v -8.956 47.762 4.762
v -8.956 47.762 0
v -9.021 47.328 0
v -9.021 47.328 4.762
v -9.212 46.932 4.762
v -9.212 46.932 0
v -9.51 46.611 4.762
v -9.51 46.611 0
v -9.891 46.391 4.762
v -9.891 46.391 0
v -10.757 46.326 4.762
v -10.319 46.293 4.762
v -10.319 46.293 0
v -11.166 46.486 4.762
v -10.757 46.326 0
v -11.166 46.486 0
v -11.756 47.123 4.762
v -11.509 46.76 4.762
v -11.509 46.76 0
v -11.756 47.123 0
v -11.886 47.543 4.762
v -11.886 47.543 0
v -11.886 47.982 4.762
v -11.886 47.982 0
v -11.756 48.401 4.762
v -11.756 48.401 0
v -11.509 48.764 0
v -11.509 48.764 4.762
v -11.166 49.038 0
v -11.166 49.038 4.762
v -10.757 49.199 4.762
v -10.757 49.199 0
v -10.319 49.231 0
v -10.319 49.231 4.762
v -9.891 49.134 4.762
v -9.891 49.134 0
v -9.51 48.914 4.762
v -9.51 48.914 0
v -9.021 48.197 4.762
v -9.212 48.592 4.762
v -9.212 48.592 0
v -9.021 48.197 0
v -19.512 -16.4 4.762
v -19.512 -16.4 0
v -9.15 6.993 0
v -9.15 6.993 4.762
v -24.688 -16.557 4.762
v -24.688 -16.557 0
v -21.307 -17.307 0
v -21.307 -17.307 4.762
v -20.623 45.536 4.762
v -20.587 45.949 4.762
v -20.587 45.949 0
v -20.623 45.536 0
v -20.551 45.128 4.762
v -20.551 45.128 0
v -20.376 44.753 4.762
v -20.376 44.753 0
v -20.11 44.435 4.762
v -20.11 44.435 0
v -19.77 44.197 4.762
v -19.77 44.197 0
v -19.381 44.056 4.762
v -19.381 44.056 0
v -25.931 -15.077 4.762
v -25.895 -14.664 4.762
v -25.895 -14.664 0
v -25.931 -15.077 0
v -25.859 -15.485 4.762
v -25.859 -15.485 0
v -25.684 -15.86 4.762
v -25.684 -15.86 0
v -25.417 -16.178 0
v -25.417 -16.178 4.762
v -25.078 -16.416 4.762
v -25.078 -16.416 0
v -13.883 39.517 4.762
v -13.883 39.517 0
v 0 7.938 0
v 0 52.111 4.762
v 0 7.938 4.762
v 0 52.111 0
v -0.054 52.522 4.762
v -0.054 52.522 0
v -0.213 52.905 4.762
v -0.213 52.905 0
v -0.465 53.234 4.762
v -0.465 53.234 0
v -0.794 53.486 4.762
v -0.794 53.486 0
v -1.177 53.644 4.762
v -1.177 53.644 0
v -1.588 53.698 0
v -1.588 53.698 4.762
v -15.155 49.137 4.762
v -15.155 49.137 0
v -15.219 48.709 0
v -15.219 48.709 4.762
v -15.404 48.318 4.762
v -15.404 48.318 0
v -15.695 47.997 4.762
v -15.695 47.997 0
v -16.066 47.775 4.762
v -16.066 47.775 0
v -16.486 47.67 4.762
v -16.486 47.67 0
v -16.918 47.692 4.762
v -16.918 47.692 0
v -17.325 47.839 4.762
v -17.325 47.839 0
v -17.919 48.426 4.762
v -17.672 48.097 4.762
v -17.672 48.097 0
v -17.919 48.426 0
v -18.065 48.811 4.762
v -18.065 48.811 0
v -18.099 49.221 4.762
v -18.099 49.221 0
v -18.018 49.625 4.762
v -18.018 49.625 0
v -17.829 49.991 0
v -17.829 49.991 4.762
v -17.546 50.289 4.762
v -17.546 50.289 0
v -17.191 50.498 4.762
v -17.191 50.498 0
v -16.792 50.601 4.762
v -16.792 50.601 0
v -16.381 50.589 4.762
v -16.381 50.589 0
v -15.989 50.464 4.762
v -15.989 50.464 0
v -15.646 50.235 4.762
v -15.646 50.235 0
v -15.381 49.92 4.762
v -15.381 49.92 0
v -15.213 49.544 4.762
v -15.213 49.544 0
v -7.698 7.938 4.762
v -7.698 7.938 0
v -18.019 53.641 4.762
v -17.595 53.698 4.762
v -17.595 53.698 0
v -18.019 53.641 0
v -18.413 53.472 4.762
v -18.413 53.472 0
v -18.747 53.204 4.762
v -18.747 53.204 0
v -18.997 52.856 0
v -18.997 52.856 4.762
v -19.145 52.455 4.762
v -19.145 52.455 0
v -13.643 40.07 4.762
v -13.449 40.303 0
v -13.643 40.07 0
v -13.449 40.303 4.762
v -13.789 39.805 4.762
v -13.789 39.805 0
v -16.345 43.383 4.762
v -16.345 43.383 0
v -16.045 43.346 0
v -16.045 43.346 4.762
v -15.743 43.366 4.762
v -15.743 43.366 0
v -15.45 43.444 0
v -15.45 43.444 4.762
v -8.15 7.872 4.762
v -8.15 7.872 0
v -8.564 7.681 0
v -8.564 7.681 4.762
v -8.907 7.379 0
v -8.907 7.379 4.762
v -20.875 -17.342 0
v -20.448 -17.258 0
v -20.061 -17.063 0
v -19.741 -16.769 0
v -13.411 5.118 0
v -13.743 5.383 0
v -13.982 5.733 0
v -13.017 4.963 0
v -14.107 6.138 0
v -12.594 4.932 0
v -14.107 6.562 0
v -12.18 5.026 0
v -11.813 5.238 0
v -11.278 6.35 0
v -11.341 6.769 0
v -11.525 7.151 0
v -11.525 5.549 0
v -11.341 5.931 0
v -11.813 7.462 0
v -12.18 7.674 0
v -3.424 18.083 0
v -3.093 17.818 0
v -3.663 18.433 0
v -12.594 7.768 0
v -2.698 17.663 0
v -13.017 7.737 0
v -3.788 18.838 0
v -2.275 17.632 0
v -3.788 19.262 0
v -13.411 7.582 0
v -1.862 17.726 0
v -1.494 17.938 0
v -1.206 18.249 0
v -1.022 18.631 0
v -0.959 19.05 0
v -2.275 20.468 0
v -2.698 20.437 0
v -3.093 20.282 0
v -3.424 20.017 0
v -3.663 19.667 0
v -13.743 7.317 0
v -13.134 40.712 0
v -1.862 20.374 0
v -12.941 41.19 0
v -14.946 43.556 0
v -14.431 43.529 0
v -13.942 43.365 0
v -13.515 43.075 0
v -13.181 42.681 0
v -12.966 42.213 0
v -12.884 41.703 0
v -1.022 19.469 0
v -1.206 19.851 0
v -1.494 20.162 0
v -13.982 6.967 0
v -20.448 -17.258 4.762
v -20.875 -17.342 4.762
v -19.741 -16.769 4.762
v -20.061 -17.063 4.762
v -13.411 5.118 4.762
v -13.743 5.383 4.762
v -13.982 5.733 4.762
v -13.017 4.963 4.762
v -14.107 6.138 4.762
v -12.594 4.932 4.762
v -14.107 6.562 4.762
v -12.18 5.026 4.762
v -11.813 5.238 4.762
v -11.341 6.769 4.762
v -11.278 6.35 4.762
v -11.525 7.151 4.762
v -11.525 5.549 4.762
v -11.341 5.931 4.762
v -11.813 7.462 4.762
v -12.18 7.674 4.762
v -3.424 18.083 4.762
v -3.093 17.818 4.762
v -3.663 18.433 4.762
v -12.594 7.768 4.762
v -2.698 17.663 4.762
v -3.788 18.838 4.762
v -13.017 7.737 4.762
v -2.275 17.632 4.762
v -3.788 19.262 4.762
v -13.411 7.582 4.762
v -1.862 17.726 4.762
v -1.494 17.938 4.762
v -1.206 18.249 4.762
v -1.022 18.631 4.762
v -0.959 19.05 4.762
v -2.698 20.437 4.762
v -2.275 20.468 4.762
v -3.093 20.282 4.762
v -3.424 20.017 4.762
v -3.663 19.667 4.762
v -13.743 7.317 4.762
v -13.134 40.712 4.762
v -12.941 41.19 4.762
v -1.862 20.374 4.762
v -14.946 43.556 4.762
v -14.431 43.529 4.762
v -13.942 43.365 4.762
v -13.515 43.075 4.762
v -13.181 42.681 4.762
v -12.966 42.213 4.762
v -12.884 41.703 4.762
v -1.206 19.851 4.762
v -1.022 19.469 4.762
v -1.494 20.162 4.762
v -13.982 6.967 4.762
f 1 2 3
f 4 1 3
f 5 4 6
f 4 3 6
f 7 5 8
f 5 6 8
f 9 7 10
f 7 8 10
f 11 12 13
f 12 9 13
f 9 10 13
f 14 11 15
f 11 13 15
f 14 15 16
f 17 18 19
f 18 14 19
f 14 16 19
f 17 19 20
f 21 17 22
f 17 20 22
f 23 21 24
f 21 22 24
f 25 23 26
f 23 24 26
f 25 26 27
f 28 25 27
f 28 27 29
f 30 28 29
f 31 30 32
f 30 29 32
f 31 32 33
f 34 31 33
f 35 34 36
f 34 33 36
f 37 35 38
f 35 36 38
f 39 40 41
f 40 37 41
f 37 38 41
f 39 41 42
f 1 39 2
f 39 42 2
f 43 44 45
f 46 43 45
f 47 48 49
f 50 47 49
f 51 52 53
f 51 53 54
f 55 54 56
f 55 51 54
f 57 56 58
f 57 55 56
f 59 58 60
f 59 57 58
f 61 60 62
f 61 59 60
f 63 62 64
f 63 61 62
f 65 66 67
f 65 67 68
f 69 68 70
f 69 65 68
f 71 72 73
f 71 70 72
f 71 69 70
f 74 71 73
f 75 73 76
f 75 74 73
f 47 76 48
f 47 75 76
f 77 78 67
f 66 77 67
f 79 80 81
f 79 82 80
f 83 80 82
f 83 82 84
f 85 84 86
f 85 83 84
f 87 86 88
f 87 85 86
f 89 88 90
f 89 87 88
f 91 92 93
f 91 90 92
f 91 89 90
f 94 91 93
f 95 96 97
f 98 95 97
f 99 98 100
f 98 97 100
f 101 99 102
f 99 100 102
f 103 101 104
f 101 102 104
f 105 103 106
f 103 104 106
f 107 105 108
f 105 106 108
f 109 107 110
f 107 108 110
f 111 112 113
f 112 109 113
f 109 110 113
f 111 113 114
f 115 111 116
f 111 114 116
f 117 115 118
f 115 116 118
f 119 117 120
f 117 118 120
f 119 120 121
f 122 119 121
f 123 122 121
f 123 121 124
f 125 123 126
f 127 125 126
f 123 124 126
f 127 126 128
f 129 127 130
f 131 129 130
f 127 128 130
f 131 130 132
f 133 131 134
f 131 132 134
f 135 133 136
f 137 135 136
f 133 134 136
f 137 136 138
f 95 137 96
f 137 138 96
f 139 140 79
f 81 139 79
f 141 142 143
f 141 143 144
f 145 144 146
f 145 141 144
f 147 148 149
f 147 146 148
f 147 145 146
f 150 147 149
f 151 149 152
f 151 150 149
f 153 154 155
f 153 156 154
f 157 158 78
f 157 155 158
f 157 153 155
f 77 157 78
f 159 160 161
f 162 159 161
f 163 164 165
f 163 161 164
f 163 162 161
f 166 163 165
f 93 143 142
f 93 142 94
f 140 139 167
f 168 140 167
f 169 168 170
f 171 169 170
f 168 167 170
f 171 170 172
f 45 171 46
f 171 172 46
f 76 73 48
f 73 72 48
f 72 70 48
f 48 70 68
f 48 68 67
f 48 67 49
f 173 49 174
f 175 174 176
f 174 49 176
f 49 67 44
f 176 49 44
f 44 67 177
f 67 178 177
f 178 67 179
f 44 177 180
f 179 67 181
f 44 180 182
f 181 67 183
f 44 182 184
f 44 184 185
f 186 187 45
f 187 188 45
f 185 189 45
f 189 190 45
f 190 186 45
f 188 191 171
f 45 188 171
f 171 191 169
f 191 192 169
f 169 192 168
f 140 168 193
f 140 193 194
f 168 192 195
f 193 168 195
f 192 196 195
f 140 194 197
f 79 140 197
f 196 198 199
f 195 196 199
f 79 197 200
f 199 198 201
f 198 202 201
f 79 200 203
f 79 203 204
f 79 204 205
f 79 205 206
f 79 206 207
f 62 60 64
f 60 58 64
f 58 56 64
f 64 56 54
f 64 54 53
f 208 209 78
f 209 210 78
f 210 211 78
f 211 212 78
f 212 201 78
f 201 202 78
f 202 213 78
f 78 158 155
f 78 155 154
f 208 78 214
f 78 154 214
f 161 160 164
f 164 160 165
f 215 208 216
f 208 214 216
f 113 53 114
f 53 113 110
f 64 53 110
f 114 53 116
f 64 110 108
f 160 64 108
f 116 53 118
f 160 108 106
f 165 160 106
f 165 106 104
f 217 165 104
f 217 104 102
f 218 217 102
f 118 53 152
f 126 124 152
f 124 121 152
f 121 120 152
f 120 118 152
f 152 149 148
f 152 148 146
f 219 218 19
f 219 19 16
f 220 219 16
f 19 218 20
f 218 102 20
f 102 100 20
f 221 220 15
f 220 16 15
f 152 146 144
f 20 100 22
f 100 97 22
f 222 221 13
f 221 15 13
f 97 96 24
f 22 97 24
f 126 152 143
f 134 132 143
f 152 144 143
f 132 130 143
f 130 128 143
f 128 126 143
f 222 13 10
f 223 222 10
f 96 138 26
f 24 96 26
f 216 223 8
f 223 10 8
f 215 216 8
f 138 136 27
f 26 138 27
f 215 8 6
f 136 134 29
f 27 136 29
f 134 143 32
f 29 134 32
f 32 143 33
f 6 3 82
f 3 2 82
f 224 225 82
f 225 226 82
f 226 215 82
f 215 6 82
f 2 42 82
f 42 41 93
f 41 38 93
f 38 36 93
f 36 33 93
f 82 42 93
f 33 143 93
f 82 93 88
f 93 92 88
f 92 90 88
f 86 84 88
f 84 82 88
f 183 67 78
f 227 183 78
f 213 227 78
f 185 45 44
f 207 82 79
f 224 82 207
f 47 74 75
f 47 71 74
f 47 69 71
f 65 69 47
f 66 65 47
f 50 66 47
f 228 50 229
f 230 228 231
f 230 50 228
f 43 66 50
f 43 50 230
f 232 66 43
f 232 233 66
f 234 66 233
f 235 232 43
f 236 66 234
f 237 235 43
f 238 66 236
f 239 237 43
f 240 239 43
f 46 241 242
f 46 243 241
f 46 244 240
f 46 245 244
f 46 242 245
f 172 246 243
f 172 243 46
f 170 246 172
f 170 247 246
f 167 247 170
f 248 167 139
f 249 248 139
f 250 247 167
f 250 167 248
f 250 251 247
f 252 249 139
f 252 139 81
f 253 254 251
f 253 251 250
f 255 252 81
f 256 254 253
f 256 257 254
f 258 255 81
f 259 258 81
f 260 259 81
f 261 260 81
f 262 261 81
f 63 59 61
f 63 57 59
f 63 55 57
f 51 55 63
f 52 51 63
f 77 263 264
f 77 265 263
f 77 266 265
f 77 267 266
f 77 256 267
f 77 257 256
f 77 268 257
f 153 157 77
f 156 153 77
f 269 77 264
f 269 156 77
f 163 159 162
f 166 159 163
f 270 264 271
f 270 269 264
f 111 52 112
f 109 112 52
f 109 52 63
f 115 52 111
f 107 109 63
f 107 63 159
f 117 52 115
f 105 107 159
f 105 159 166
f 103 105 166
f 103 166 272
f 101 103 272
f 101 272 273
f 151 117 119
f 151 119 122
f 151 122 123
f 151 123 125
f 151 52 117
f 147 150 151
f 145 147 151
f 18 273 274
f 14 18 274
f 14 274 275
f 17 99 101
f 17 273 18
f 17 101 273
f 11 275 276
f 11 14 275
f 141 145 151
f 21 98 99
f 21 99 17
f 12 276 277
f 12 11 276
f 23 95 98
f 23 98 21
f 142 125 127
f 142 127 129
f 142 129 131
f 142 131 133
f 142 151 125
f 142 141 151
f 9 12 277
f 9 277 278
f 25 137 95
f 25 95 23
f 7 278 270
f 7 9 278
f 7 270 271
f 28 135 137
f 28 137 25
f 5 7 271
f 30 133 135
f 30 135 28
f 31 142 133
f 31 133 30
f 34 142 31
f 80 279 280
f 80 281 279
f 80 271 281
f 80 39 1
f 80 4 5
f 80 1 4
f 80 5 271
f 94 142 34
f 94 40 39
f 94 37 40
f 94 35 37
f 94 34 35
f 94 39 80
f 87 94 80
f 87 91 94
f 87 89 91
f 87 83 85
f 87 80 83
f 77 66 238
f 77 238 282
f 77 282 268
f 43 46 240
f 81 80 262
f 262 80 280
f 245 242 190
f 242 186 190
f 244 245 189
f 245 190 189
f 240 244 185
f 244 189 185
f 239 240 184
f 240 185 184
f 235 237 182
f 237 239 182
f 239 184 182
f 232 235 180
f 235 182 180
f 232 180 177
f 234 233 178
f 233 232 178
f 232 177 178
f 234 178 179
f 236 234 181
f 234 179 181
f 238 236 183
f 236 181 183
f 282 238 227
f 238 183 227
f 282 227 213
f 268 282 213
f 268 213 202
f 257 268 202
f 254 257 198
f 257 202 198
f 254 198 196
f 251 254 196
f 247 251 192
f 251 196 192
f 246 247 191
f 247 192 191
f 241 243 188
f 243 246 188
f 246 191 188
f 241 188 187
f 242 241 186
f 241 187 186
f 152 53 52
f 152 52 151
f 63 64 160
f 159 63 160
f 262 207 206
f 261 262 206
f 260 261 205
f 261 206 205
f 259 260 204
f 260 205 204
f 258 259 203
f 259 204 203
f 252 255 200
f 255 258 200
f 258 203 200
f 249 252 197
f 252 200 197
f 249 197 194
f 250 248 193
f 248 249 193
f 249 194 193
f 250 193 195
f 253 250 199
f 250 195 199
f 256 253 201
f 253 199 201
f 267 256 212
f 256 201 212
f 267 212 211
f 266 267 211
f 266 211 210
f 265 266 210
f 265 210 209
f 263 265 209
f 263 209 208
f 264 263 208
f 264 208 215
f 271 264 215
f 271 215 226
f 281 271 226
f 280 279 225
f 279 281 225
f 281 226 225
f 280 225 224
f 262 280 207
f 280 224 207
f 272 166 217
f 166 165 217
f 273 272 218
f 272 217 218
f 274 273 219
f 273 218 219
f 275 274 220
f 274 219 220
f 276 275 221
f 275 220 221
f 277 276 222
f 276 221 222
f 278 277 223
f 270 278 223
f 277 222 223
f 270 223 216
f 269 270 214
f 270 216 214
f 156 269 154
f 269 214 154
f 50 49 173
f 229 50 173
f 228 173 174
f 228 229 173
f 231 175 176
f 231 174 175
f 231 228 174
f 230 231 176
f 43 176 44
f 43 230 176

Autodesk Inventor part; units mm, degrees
ref_plane "YZ Plane" through (0, 0, 0) normal (1, 0, 0) x (0, 1, 0)
ref_plane "XZ Plane" through (0, 0, 0) normal (0, 1, 0) x (-1, 0, 0)
ref_plane "XY Plane" through (0, 0, 0) normal (0, 0, 1) x (1, 0, 0)
sketch "Sketch1" plane through (0, 0, 0) normal (0, 0, 1) x (1, 0, 0)
  line L0 (0, 0) -> (0, 136.525) construction
  line L1 (-11.7886, 12.2907) -> (-39.6863, 18.4755) construction
  line L2 (-39.6863, 18.4755) -> (-33.3297, 47.1481) construction
  line L3 (-33.3297, 47.1481) -> (-5.432, 40.9633)
  line L4 (-5.432, 40.9633) -> (-11.7886, 12.2907) construction
  line L5 (-39.6863, 18.4755) -> (-5.432, 40.9633) construction
  line L6 (-33.3297, 47.1481) -> (-11.7886, 12.2907) construction
  circle A0 centre (-53.975, 12.7) radius 3.175 construction
  circle A1 centre (-53.975, 12.7) radius 6.35 construction
  line L7 (0, 0) -> (-54.712, 6.3929) construction
  line L8 (-59.6703, 15.5082) -> (0, 136.525) construction
  line L9 (-27.1302, 45.7737) -> (-37.4529, 28.5497) construction
  line L10 (-11.6315, 42.3377) -> (-9.5552, 22.3649) construction
  line L11 (-19.3809, 44.0557) -> (-25.7374, 15.3831) construction
  line L12 (0, 92.075) -> (-19.7574, 96.4551) construction
  line L13 (-35.3766, 8.5768) -> (-19.8779, 5.1408) construction
  line L14 (-19.8779, 5.1408) -> (-21.2523, -1.0586) construction
  line L15 (-21.2523, -1.0586) -> (-36.751, 2.3773) construction
  line L16 (-36.751, 2.3773) -> (-35.3766, 8.5768) construction
  line L17 (-35.3766, 8.5768) -> (-41.27, 4.8223) construction
  line L18 (-19.8779, 5.1408) -> (-17.9381, 2.096) construction
  line L19 (-5.432, 40.9633) -> (-33.3297, 47.1481) construction
  line L20 (-33.3297, 47.1481) -> (-32.2475, 52.0296) construction
  line L21 (-32.2475, 52.0296) -> (-4.3498, 45.8448) construction
  line L22 (-4.3498, 45.8448) -> (-5.432, 40.9633) construction
  line L23 (-53.2878, 15.7997) -> (-53.975, 12.7) construction
  line L24 (-53.975, 12.7) -> (-57.0747, 13.3872) construction
  line L25 (-27.6272, 6.8588) -> (-34.4992, -24.1386) construction
  line L26 (-31.8676, 50.076) -> (-5.5198, 44.2349)
  line L27 (-5.5198, 44.2349) -> (-4.489, 48.8845) construction
  line L28 (-4.489, 48.8845) -> (-30.8368, 54.7256) construction
  line L29 (-30.8368, 54.7256) -> (-31.8676, 50.076) construction
  line L30 (-31.3522, 52.4008) -> (-5.0044, 46.5597) construction
  circle A2 centre (-29.0274, 51.8854) radius 1.4732 construction
  circle A3 centre (-22.8279, 50.5111) radius 1.4732 construction
  circle A4 centre (-16.6284, 49.1367) radius 1.4732
  circle A5 centre (-10.4289, 47.7623) radius 1.4732
  circle A6 centre (-10.3614, 84.7398) radius 1.4732 construction
  line L31 (-53.975, 12.7) -> (-13.3751, 95.0402) construction
  line L32 (-32.2923, 56.6744) -> (0, 49.5153)
  circle A7 centre (-10.3614, 84.7398) radius 4.7625 construction
  line L33 (-4.7625, 50.5712) -> (-4.7625, 93.1308) construction
  line L34 (-27.5056, 55.6132) -> (-14.3936, 82.2055) construction
  line L35 (-5.6003, 84.6261) -> (-4.7625, 84.4403) construction
  line L36 (-17.9381, 2.096) -> (0, 2.096) construction
  line L37 (0, 2.096) -> (0, -1.079) construction
  line L38 (0, -1.079) -> (-17.9381, -1.079) construction
  line L39 (-17.9381, -1.079) -> (-17.9381, 2.096) construction
  circle A8 centre (-12.7, 7.9375) radius 1.5875 construction
  line L40 (-12.7, 7.9375) -> (0, 7.9375)
  line L41 (0, 7.9375) -> (-17.9381, 2.096) construction
  circle A9 centre (-12.7, 7.9375) radius 3.175 construction
  line L42 (-9.525, 7.9375) -> (-9.525, 4.8357) construction
  line L43 (-9.525, 7.9375) -> (0, 7.9375) construction
  line L44 (-17.9187, 46.9837) -> (-16.8879, 51.6333)
  line L45 (-12.4942, 45.7811) -> (-26.2381, -16.2137)
  line L46 (0, 66.675) -> (0, 7.9375)
  line L47 (-26.2381, -16.2137) -> (-20.0386, -17.5881)
  line L48 (-20.0386, -17.5881) -> (-8.7313, 7.9375)
  circle A10 centre (-12.7, 6.35) radius 1.4224
  line L49 (0, 13.4938) -> (-4.7625, 13.4938) construction
  line L50 (-4.7625, 13.4938) -> (-4.7625, 24.6063) construction
  line L51 (-4.7625, 24.6063) -> (0, 24.6063) construction
  line L52 (0, 24.6063) -> (0, 13.4938)
  line L53 (-4.7625, 19.05) -> (0, 19.05) construction
  circle A11 centre (-2.3813, 19.05) radius 1.4224
  line L54 (-20.7405, 8.5842) -> (-9.7454, 58.18)
  line L55 (-9.7454, 58.18) -> (-3.5459, 56.8056) construction
  line L56 (-3.5459, 56.8056) -> (-14.5411, 7.2098) construction
  line L57 (-14.5411, 7.2098) -> (-20.7405, 8.5842)
  line L58 (-12.7, 6.35) -> (-12.7, 7.9375) construction
  line L59 (-11.5442, 1.5875) -> (-9.525, 1.5875)
  line L60 (-9.525, 1.5875) -> (-9.525, 7.9375)
  line L61 (-9.525, 7.9375) -> (-11.5442, 7.9375)
  line L62 (-11.5442, 7.9375) -> (-11.5442, 1.5875) construction
  line L63 (-9.7454, 58.18) -> (-15.9449, 59.5544)
  line L64 (-15.9449, 59.5544) -> (-14.6504, 65.3933)
  line L65 (-14.6504, 65.3933) -> (0, 66.675)
  line L66 (-9.7454, 58.18) -> (-17.3193, 53.3549) construction
  arc A12 (-10.2313, 55.9882) -> (-11.9373, 58.6659) centre (-11.0843, 57.3271) ccw
  line L67 (-4.7625, 57.15) -> (0, 57.15) construction
  circle A13 centre (-2.3813, 57.15) radius 1.4224
  circle A14 centre (-2.3813, 63.5) radius 1.4224
  line L68 (-20.9307, 44.3993) -> (-18.8691, 53.6985)
  line L69 (-12.4942, 45.7811) -> (-16.2811, 43.3685) construction
  arc A15 (-13.0773, 43.1508) -> (-15.1244, 46.3642) centre (-14.1008, 44.7575) ccw
  line L70 (-18.8691, 53.6985) -> (0, 53.6985)
  line L71 (-13.1814, 42.6813) -> (-14.788, 41.6578) construction
  circle A16 centre (-14.788, 41.6578) radius 1.905
  point P0 (-22.5591, 29.7194)
  point P1 (-20.4869, 2.3938)
  point P2 (-36.3367, 4.2458)
  point P3 (-51.1668, 18.3953)
  point P4 (-11.1125, 7.9375)
  point P5 (-11.4283, 6.9872)
  point P6 (-11.9574, 7.9375)
  point P7 (-13.9717, 6.9872)
  point P8 (-9.525, 6.1457)
  point P9 (-15.8116, 43.2644)
  point P10 (-13.7645, 40.0511)
  dimension "d74" = 6.35
  dimension "d122" = 3.81
  dimension "d13" = 136.525
  dimension "d14" = 29.3687
  dimension "d15" = 28.575
  dimension "d16" = 12.5
  dimension "d17" = 6.35
  dimension "d19" = 53.975
  dimension "d22" = 12.7
  dimension "d23" = 7.9375
  dimension "d24" = 19.05
  dimension "d26" = 102.5
  dimension "d29" = 6.35
  dimension "d31" = 7.9375
  dimension "d34" = 5
  dimension "d35" = 26.9875
  dimension "d38" = 31.75
  dimension "d40" = 26.9875
  dimension "d41" = 4.7625
  dimension "d42" = 2.9464
  dimension "d43" = 2.3813
  dimension "d46" = 6.35
  dimension "d51" = 2.9464
  dimension "d52" = 79.7719
  dimension "d53" = 6.35
  dimension "d54" = 9.525
  dimension "d55" = 4.7625
  dimension "d56" = 4.7625
  dimension "d60" = 12.7
  dimension "d61" = 3.175
  dimension "d63" = 3.175
  dimension "d66" = 3.175
  dimension "d67" = 12.7
  dimension "d72" = 8.7312
  dimension "d73" = 7.9375
  dimension "d75" = 34.925
  dimension "d80" = 12.7
  dimension "d82" = 7.9375
  dimension "d83" = 63.5
  dimension "d84" = 66.675
  dimension "d85" = 6.35
  dimension "d86" = 92.075
  dimension "d87" = 2.8448
  dimension "d88" = 4.7625
  dimension "d89" = 11.1125
  dimension "d90" = 2.8448
  dimension "d91" = 19.05
  dimension "d92" = 6.35
  dimension "d93" = 50.8
  dimension "d94" = 25.4
  dimension "d95" = 8.7312
  dimension "d96" = 9.525
  dimension "d97" = 6.35
  dimension "d99" = 6.35
  dimension "d101" = 3.175
  dimension "d106" = 2.8448
  dimension "d107" = 57.15
  dimension "d110" = 6.35
  dimension "d119" = 85
  dimension "d120" = 3.175
  dimension "d121" = 3.81
extrude "Extrusion1" add sketch "Sketch1" along normal blind 4.7625 contours L68 L26 L45 A16 L3 | L68 L32 L54 A15 L26 | L45 A15 L54 L32 L46 L40 L60 L48 L47 A16 | L70 L54 L32 | L45 A15 | A15 L26 | L54 L70 L46 L32 | L60 L40 L48
fillet "Fillet1" radius 1.5875 3 edges at (-26.2381, -16.2137, 2.3813) (-20.0386, -17.5881, 2.3813) (-8.7313, 7.9375, 2.3813)
fillet "Fillet4" radius 1.5875 5 edges at (-18.8691, 53.6985, 2.3813) (0, 53.6985, 2.3813) (-20.9307, 44.3993, 2.3813) (-15.8116, 43.2644, 2.3813) (-13.7645, 40.0511, 2.3813)
equation "\"d56\" = d55"
properties part number "Uprights" material "UHMW, White"
